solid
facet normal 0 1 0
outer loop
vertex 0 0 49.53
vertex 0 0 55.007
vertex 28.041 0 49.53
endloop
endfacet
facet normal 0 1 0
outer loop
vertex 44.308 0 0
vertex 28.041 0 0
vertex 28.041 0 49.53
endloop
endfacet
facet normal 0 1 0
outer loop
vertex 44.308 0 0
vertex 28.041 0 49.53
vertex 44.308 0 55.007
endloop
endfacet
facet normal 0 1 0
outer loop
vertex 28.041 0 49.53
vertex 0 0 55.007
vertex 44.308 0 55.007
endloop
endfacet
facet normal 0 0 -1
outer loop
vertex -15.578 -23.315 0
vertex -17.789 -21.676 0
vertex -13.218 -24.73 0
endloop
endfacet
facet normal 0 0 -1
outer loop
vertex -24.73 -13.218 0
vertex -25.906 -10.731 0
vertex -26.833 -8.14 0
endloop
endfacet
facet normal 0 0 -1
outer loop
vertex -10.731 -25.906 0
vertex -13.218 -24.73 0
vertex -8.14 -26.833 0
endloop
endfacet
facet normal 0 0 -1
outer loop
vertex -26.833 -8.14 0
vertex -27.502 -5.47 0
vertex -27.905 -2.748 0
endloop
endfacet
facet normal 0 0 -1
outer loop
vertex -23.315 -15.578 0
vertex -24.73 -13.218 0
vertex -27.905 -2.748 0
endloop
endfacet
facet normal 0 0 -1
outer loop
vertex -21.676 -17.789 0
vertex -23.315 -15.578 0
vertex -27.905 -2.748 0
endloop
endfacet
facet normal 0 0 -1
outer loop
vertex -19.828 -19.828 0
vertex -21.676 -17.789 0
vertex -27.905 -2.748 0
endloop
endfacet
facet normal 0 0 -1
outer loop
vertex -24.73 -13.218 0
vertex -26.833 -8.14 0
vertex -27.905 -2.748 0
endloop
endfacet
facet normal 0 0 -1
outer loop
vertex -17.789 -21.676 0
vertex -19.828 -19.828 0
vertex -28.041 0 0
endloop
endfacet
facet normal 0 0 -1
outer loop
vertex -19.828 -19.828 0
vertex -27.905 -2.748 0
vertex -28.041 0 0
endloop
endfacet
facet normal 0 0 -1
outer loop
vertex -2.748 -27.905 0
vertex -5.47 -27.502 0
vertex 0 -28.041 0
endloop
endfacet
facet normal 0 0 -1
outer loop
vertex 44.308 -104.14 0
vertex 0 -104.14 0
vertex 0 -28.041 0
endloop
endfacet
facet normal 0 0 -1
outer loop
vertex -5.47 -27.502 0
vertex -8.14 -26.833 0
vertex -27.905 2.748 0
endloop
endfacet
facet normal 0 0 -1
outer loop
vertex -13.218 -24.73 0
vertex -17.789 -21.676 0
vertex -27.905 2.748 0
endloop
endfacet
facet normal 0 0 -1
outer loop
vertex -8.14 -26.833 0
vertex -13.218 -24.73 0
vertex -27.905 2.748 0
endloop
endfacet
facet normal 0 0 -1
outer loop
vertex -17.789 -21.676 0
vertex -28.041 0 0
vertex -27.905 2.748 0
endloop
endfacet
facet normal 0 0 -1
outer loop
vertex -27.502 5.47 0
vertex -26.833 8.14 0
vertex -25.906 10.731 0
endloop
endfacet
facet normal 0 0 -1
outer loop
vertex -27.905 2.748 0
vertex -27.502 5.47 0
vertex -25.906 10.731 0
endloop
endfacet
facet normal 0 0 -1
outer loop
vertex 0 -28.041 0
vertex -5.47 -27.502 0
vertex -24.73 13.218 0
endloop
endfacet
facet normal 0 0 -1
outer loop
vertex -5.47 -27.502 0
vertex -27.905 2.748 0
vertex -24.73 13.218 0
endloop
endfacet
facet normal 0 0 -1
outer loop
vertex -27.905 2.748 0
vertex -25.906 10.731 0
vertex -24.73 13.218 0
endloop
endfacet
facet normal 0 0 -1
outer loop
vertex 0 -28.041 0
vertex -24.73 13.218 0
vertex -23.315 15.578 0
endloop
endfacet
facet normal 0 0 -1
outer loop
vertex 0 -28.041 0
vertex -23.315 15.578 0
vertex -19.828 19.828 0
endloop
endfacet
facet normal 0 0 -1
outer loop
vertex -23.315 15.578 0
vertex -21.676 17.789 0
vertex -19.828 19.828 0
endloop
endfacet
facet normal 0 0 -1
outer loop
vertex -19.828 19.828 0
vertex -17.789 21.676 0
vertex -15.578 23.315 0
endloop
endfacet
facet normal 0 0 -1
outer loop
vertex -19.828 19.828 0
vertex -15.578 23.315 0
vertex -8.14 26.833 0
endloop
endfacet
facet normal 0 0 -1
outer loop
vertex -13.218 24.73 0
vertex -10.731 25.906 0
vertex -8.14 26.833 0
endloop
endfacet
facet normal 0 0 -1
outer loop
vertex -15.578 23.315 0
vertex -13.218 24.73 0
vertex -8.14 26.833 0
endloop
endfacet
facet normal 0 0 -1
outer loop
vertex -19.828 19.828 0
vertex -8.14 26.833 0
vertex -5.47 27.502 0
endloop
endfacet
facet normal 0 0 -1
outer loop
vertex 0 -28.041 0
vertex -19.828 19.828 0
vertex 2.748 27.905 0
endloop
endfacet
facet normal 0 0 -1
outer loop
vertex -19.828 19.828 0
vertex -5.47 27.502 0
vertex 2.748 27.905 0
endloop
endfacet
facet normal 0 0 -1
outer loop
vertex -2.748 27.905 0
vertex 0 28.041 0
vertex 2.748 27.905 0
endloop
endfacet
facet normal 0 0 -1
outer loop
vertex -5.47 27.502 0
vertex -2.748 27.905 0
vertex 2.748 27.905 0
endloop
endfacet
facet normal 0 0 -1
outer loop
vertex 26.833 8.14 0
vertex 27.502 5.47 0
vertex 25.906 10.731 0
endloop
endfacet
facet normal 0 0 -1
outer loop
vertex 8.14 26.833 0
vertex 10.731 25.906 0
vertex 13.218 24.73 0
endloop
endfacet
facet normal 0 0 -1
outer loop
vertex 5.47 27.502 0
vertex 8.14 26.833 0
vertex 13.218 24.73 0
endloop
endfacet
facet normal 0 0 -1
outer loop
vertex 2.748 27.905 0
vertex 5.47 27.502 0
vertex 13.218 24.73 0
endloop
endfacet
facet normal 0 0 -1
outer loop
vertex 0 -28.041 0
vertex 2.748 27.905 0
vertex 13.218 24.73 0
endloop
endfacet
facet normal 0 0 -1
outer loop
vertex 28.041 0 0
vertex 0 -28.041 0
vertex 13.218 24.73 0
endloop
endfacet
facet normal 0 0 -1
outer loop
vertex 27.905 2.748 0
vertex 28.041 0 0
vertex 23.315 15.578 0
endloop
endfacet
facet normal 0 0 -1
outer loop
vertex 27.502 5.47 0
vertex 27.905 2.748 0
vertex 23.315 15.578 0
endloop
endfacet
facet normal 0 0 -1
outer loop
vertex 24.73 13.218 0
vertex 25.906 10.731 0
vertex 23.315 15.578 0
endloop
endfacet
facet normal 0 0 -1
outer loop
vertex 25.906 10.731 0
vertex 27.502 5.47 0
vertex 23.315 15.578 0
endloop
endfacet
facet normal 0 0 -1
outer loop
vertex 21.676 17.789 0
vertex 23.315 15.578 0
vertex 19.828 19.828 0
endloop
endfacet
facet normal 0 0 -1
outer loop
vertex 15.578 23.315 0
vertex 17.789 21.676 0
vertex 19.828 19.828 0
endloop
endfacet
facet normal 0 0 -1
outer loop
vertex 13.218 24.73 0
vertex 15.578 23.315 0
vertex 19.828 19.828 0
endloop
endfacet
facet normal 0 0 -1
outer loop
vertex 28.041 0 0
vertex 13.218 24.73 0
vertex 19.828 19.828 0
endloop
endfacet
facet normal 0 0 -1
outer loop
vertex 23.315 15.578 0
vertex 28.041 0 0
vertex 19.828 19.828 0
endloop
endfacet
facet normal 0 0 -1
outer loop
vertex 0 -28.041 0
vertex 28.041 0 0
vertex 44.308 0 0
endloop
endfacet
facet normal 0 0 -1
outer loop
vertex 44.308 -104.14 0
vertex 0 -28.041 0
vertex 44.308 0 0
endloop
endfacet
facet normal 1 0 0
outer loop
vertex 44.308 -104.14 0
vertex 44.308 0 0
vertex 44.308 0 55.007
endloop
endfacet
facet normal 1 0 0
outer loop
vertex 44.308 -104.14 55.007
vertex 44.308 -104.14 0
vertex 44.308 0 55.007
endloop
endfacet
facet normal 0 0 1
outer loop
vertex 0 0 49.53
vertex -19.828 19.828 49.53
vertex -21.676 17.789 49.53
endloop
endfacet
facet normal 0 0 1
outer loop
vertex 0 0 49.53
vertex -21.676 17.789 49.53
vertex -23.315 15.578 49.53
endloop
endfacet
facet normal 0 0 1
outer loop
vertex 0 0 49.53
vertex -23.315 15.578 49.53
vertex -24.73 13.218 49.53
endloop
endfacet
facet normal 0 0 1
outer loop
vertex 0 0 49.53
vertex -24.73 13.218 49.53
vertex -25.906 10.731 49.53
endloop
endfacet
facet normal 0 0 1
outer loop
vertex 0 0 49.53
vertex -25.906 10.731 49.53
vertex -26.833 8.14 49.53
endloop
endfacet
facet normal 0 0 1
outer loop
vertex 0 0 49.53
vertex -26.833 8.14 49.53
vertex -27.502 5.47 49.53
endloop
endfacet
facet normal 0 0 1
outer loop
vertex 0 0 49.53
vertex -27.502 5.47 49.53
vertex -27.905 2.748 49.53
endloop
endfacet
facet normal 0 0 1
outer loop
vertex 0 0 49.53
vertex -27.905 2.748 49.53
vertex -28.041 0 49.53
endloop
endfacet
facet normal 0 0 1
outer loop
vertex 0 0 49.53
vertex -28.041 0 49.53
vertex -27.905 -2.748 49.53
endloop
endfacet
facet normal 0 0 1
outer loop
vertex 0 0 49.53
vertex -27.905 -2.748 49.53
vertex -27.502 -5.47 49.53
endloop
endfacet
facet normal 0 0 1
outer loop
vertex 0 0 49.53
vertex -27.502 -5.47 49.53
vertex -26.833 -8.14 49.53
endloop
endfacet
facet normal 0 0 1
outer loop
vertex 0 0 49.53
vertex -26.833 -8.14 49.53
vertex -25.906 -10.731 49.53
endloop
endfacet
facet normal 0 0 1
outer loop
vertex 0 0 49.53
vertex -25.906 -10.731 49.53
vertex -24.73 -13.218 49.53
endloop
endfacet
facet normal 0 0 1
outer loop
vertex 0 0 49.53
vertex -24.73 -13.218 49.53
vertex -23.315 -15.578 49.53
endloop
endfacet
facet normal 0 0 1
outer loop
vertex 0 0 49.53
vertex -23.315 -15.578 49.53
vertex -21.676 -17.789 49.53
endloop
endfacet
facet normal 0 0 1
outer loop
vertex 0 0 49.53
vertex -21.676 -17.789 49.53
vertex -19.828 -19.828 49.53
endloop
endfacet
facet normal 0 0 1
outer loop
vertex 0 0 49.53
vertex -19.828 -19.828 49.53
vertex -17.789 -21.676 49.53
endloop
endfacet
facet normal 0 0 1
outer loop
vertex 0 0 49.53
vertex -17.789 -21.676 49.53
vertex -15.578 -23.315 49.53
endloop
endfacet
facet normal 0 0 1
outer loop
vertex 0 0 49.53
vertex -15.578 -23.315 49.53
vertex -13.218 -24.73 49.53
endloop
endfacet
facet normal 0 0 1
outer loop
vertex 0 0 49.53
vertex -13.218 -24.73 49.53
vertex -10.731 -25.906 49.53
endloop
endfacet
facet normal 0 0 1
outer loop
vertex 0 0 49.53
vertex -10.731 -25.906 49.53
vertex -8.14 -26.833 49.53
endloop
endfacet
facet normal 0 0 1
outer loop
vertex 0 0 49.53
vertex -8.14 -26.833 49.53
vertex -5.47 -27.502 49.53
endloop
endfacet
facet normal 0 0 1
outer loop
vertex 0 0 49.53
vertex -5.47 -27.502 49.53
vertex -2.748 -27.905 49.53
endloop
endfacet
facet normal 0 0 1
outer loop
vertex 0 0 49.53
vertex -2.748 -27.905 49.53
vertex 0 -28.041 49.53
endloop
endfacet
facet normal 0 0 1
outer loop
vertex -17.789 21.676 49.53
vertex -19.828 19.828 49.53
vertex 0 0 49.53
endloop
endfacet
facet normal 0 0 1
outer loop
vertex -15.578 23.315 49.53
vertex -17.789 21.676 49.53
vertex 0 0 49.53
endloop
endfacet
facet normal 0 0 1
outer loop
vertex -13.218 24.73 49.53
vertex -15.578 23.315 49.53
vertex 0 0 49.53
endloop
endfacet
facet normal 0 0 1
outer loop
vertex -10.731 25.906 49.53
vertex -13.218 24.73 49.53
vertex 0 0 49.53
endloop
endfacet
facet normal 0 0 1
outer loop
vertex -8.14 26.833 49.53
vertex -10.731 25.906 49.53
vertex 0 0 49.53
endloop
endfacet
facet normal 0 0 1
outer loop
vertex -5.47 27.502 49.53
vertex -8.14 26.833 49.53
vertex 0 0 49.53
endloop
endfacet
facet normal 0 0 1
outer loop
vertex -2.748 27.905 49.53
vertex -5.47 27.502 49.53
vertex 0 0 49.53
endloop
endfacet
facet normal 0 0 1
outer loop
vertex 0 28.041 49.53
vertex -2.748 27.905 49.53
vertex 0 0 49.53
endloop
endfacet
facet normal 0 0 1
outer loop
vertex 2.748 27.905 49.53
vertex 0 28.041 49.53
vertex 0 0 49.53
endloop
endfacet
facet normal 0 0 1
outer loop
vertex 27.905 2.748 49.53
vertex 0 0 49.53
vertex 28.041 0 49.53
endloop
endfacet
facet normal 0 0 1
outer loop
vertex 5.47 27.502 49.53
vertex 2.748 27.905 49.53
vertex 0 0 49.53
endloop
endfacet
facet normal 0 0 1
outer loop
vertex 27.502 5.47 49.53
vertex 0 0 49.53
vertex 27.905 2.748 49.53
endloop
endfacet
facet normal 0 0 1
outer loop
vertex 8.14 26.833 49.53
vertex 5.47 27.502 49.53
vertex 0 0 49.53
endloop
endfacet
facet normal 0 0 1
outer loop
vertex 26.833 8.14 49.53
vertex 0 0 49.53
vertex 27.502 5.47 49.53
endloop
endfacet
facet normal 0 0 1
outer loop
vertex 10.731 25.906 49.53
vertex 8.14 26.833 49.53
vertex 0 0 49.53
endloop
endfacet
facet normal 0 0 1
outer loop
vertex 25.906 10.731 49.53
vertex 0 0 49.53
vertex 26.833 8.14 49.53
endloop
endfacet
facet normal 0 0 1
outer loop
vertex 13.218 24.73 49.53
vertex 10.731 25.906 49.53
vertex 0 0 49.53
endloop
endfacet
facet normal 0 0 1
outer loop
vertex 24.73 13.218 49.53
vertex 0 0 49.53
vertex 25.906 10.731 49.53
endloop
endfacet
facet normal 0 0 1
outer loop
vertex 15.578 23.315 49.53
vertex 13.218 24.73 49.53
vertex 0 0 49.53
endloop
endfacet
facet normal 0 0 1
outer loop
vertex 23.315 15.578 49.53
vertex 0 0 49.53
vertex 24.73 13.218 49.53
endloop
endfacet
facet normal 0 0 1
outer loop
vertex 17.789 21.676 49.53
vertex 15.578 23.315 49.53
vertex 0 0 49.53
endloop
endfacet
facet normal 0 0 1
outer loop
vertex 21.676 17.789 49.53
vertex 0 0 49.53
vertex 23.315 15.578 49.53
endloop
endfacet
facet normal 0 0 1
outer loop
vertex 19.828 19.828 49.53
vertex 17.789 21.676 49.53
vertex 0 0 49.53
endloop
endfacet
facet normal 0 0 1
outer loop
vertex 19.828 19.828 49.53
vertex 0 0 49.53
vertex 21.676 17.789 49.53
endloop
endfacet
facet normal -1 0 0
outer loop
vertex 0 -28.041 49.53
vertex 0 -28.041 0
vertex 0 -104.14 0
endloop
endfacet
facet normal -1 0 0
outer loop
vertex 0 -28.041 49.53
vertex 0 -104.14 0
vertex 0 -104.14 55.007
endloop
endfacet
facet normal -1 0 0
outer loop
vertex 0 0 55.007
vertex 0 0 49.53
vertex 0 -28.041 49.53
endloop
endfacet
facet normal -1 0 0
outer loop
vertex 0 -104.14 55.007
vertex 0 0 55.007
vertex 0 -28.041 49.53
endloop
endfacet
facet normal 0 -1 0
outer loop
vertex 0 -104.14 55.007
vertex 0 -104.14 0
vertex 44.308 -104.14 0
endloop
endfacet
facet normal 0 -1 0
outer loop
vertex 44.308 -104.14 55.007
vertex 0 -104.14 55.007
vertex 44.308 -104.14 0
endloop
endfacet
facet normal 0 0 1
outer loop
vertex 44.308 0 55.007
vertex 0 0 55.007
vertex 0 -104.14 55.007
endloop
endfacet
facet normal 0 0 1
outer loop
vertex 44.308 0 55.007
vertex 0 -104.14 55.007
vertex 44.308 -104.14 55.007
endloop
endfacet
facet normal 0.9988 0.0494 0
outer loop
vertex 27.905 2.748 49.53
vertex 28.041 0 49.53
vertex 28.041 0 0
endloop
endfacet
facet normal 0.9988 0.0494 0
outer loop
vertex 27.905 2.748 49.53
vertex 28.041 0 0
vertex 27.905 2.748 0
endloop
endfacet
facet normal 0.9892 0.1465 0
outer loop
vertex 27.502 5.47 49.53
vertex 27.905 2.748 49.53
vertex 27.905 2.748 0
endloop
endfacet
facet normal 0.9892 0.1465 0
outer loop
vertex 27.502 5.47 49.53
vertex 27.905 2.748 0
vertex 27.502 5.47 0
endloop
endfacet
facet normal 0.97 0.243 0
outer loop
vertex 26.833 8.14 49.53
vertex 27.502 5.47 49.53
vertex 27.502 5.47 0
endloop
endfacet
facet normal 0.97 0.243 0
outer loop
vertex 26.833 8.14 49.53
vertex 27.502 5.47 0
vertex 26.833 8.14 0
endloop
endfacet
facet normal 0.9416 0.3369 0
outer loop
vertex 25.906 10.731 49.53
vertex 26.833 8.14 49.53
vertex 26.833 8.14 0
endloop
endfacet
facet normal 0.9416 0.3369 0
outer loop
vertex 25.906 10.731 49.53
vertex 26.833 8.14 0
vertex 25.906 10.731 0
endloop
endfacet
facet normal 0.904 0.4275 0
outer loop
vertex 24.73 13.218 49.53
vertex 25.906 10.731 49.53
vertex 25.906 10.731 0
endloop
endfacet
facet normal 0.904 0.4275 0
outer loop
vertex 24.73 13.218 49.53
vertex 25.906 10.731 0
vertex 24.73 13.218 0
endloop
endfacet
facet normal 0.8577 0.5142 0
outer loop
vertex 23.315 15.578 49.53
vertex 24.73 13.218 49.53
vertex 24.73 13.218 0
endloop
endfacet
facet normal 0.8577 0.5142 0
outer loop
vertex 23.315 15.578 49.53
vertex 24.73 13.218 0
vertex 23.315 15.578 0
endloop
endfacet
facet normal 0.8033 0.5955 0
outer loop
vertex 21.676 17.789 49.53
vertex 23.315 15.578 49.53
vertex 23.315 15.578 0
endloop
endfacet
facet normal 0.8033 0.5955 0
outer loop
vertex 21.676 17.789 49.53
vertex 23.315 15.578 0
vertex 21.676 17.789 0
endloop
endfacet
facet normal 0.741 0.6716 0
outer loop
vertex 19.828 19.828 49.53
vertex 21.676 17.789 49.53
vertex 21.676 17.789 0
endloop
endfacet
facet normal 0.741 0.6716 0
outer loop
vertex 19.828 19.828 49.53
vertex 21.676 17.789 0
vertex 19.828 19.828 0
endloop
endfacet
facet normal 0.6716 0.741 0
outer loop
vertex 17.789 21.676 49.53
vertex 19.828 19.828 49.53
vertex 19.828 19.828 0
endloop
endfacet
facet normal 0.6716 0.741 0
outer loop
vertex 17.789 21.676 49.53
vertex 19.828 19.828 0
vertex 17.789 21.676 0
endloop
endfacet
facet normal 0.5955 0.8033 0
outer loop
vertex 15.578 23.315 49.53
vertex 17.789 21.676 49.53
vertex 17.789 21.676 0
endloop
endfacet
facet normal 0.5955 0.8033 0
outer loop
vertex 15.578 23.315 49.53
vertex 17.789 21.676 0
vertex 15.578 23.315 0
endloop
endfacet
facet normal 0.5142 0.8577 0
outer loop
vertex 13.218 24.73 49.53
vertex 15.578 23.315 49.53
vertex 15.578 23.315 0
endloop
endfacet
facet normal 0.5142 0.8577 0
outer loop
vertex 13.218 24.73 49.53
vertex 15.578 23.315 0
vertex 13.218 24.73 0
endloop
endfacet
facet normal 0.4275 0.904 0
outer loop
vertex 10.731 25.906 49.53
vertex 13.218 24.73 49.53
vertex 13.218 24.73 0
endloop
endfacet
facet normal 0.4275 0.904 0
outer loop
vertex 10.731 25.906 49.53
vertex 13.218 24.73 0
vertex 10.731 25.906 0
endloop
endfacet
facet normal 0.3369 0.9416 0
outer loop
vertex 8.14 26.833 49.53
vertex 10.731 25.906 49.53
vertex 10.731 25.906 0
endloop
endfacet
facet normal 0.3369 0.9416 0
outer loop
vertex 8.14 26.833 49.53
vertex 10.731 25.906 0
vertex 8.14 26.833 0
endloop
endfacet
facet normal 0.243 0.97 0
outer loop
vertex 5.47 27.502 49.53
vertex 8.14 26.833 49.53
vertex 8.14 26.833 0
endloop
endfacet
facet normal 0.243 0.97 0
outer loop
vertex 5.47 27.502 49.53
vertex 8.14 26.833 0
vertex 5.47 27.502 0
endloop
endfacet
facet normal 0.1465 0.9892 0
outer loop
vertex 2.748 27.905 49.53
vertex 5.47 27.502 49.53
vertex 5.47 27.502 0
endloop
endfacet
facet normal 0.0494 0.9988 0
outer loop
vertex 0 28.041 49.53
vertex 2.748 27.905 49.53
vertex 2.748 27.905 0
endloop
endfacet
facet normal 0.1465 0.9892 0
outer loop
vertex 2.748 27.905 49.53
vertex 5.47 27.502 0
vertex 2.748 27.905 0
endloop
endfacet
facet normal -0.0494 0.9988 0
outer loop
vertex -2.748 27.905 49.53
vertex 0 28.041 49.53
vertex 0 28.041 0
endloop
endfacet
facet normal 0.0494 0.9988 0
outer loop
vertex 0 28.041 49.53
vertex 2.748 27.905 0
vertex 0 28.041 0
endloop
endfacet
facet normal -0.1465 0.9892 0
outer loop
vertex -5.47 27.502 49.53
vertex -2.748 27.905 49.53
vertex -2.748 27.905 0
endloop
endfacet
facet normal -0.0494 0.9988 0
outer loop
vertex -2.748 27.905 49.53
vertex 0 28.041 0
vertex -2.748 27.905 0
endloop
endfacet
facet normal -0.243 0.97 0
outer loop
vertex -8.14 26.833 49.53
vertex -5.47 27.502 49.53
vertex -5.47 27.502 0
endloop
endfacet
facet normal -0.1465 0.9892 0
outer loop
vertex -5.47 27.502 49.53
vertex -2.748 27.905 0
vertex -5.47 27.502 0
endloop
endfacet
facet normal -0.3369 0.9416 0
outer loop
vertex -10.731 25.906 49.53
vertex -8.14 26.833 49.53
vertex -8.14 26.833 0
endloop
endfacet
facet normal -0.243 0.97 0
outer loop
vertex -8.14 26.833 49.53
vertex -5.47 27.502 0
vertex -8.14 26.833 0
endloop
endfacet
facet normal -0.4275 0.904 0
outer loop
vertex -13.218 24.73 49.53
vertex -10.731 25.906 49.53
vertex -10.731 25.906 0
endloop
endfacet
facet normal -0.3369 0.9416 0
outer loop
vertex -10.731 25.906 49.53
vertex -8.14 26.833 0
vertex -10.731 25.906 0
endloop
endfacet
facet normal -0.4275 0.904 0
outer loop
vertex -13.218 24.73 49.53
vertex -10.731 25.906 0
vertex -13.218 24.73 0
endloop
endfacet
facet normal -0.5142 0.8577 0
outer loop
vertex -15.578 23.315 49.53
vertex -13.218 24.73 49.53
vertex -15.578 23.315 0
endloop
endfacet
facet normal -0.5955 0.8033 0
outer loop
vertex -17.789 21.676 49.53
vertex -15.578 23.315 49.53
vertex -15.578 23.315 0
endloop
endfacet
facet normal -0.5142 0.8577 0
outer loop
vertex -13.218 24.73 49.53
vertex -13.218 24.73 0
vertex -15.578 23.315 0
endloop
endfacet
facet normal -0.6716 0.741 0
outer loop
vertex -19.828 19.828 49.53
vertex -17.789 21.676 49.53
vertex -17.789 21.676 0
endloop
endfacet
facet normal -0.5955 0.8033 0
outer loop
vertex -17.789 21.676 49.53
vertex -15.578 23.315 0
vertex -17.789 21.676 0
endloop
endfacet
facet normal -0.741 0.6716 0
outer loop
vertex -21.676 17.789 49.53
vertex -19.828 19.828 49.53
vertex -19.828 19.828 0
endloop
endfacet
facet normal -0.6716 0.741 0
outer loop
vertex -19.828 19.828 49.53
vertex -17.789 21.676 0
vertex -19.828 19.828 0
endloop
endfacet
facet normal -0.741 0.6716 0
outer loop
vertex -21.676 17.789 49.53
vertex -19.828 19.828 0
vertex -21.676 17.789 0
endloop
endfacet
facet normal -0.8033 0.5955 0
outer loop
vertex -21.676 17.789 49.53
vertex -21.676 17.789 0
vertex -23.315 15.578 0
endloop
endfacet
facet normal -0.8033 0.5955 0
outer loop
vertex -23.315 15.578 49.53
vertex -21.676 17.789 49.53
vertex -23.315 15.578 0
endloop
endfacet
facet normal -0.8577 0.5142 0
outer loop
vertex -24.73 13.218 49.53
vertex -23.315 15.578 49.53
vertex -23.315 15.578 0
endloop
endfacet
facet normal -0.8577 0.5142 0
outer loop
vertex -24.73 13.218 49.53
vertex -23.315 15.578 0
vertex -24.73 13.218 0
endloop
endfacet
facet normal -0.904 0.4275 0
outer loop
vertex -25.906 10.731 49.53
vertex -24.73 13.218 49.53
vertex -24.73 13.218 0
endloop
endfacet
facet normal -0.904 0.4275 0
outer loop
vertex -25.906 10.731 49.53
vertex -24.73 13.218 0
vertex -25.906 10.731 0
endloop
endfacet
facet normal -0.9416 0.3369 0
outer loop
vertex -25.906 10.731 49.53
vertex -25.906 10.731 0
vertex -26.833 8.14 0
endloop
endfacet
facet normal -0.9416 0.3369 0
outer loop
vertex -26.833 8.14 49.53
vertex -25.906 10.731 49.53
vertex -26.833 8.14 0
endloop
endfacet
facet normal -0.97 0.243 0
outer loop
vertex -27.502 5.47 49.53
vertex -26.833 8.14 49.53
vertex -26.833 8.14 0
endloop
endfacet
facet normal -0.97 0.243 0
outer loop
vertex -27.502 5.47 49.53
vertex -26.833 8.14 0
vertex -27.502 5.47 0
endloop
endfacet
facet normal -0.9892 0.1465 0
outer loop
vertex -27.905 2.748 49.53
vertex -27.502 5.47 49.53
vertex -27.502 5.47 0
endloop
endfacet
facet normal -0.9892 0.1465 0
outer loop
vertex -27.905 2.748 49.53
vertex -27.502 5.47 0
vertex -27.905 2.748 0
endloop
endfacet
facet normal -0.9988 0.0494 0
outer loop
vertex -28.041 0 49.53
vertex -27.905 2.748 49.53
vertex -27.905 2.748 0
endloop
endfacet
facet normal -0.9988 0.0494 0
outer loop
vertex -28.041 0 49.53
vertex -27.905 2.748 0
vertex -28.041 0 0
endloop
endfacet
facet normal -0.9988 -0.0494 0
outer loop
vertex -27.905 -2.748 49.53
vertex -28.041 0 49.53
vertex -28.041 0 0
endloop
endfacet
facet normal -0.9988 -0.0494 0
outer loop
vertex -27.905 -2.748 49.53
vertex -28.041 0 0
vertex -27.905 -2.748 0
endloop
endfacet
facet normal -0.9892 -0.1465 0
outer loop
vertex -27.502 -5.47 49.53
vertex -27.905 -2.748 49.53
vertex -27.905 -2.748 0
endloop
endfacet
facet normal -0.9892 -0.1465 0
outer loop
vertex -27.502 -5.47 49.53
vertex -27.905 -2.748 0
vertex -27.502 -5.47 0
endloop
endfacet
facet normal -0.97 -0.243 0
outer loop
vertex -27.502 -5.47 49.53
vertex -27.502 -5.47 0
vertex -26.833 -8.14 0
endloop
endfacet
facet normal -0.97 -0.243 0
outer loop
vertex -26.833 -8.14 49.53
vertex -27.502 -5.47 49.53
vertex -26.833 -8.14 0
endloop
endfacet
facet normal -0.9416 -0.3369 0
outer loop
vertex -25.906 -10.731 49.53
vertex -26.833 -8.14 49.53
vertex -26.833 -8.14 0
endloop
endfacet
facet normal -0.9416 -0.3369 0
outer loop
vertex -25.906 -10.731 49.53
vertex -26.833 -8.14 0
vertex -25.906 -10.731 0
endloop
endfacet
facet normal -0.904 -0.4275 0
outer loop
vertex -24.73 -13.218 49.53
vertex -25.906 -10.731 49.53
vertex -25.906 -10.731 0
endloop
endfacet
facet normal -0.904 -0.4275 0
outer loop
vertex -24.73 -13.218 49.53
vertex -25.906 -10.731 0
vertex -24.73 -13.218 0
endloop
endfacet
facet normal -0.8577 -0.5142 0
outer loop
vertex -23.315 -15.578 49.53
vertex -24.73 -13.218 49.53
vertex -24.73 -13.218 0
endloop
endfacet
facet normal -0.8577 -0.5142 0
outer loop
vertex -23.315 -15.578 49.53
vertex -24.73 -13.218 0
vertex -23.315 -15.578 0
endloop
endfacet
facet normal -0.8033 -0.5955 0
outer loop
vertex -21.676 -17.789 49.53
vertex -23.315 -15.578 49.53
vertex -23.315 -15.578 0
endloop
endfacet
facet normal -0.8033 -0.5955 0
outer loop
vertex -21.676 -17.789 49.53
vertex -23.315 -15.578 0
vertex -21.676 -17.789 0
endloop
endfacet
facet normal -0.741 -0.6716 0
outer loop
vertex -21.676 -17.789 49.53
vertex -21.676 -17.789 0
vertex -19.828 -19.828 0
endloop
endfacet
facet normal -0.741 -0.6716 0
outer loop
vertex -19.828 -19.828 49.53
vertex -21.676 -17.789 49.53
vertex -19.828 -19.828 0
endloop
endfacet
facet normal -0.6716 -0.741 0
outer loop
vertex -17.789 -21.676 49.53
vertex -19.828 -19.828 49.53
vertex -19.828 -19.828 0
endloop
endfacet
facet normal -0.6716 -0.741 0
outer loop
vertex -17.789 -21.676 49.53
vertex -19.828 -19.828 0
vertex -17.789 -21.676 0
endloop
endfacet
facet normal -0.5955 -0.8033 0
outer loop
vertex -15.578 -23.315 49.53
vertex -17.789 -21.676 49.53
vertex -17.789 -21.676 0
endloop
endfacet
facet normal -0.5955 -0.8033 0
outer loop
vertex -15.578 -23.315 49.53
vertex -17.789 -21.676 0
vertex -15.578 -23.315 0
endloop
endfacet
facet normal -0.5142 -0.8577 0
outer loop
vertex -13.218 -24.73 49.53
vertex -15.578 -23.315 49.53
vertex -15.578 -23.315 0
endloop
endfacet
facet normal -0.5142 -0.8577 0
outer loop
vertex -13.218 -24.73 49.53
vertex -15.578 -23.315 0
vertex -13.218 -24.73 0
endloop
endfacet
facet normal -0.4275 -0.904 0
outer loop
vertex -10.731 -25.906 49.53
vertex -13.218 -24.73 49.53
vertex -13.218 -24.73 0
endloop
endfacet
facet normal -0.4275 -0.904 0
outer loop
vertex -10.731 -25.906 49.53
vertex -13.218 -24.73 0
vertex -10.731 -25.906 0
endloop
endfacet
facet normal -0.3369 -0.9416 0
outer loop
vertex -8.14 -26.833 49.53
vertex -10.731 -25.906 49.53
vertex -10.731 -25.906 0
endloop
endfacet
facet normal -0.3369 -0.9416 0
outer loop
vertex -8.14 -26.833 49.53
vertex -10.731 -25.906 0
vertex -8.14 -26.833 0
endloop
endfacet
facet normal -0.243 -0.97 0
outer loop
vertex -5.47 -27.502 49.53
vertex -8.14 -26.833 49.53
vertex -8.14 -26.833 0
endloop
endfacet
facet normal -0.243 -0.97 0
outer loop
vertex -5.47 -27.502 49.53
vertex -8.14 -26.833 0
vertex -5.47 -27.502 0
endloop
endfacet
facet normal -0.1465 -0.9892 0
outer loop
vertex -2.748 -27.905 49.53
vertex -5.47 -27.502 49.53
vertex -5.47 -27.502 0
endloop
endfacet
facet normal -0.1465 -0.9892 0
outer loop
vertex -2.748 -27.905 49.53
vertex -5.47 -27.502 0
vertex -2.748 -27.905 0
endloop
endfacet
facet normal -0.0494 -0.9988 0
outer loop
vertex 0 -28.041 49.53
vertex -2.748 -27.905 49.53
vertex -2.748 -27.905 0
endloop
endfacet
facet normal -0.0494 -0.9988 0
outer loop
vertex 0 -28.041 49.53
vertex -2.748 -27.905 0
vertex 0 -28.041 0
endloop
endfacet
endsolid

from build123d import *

# Parameters (mm, degrees)
F0_R     = 28.0405076849
F1_DEPTH = 49.53
F2_W     = 44.3078614771
F2_H     = 55.0068765879
F3_DEPTH = 104.14


with BuildPart() as f1:
    # F0 (on Top) → F1 (new body)
    with BuildSketch(Plane.XY):
        Circle(F0_R)
    extrude(amount=F1_DEPTH)

    # F2 (on Front) → F3 (join)
    with BuildSketch(Plane.XZ):
        with Locations((22.1539307386, 27.5034382939)):
            Rectangle(F2_W, F2_H)
    extrude(amount=F3_DEPTH)


solid = f1.part
